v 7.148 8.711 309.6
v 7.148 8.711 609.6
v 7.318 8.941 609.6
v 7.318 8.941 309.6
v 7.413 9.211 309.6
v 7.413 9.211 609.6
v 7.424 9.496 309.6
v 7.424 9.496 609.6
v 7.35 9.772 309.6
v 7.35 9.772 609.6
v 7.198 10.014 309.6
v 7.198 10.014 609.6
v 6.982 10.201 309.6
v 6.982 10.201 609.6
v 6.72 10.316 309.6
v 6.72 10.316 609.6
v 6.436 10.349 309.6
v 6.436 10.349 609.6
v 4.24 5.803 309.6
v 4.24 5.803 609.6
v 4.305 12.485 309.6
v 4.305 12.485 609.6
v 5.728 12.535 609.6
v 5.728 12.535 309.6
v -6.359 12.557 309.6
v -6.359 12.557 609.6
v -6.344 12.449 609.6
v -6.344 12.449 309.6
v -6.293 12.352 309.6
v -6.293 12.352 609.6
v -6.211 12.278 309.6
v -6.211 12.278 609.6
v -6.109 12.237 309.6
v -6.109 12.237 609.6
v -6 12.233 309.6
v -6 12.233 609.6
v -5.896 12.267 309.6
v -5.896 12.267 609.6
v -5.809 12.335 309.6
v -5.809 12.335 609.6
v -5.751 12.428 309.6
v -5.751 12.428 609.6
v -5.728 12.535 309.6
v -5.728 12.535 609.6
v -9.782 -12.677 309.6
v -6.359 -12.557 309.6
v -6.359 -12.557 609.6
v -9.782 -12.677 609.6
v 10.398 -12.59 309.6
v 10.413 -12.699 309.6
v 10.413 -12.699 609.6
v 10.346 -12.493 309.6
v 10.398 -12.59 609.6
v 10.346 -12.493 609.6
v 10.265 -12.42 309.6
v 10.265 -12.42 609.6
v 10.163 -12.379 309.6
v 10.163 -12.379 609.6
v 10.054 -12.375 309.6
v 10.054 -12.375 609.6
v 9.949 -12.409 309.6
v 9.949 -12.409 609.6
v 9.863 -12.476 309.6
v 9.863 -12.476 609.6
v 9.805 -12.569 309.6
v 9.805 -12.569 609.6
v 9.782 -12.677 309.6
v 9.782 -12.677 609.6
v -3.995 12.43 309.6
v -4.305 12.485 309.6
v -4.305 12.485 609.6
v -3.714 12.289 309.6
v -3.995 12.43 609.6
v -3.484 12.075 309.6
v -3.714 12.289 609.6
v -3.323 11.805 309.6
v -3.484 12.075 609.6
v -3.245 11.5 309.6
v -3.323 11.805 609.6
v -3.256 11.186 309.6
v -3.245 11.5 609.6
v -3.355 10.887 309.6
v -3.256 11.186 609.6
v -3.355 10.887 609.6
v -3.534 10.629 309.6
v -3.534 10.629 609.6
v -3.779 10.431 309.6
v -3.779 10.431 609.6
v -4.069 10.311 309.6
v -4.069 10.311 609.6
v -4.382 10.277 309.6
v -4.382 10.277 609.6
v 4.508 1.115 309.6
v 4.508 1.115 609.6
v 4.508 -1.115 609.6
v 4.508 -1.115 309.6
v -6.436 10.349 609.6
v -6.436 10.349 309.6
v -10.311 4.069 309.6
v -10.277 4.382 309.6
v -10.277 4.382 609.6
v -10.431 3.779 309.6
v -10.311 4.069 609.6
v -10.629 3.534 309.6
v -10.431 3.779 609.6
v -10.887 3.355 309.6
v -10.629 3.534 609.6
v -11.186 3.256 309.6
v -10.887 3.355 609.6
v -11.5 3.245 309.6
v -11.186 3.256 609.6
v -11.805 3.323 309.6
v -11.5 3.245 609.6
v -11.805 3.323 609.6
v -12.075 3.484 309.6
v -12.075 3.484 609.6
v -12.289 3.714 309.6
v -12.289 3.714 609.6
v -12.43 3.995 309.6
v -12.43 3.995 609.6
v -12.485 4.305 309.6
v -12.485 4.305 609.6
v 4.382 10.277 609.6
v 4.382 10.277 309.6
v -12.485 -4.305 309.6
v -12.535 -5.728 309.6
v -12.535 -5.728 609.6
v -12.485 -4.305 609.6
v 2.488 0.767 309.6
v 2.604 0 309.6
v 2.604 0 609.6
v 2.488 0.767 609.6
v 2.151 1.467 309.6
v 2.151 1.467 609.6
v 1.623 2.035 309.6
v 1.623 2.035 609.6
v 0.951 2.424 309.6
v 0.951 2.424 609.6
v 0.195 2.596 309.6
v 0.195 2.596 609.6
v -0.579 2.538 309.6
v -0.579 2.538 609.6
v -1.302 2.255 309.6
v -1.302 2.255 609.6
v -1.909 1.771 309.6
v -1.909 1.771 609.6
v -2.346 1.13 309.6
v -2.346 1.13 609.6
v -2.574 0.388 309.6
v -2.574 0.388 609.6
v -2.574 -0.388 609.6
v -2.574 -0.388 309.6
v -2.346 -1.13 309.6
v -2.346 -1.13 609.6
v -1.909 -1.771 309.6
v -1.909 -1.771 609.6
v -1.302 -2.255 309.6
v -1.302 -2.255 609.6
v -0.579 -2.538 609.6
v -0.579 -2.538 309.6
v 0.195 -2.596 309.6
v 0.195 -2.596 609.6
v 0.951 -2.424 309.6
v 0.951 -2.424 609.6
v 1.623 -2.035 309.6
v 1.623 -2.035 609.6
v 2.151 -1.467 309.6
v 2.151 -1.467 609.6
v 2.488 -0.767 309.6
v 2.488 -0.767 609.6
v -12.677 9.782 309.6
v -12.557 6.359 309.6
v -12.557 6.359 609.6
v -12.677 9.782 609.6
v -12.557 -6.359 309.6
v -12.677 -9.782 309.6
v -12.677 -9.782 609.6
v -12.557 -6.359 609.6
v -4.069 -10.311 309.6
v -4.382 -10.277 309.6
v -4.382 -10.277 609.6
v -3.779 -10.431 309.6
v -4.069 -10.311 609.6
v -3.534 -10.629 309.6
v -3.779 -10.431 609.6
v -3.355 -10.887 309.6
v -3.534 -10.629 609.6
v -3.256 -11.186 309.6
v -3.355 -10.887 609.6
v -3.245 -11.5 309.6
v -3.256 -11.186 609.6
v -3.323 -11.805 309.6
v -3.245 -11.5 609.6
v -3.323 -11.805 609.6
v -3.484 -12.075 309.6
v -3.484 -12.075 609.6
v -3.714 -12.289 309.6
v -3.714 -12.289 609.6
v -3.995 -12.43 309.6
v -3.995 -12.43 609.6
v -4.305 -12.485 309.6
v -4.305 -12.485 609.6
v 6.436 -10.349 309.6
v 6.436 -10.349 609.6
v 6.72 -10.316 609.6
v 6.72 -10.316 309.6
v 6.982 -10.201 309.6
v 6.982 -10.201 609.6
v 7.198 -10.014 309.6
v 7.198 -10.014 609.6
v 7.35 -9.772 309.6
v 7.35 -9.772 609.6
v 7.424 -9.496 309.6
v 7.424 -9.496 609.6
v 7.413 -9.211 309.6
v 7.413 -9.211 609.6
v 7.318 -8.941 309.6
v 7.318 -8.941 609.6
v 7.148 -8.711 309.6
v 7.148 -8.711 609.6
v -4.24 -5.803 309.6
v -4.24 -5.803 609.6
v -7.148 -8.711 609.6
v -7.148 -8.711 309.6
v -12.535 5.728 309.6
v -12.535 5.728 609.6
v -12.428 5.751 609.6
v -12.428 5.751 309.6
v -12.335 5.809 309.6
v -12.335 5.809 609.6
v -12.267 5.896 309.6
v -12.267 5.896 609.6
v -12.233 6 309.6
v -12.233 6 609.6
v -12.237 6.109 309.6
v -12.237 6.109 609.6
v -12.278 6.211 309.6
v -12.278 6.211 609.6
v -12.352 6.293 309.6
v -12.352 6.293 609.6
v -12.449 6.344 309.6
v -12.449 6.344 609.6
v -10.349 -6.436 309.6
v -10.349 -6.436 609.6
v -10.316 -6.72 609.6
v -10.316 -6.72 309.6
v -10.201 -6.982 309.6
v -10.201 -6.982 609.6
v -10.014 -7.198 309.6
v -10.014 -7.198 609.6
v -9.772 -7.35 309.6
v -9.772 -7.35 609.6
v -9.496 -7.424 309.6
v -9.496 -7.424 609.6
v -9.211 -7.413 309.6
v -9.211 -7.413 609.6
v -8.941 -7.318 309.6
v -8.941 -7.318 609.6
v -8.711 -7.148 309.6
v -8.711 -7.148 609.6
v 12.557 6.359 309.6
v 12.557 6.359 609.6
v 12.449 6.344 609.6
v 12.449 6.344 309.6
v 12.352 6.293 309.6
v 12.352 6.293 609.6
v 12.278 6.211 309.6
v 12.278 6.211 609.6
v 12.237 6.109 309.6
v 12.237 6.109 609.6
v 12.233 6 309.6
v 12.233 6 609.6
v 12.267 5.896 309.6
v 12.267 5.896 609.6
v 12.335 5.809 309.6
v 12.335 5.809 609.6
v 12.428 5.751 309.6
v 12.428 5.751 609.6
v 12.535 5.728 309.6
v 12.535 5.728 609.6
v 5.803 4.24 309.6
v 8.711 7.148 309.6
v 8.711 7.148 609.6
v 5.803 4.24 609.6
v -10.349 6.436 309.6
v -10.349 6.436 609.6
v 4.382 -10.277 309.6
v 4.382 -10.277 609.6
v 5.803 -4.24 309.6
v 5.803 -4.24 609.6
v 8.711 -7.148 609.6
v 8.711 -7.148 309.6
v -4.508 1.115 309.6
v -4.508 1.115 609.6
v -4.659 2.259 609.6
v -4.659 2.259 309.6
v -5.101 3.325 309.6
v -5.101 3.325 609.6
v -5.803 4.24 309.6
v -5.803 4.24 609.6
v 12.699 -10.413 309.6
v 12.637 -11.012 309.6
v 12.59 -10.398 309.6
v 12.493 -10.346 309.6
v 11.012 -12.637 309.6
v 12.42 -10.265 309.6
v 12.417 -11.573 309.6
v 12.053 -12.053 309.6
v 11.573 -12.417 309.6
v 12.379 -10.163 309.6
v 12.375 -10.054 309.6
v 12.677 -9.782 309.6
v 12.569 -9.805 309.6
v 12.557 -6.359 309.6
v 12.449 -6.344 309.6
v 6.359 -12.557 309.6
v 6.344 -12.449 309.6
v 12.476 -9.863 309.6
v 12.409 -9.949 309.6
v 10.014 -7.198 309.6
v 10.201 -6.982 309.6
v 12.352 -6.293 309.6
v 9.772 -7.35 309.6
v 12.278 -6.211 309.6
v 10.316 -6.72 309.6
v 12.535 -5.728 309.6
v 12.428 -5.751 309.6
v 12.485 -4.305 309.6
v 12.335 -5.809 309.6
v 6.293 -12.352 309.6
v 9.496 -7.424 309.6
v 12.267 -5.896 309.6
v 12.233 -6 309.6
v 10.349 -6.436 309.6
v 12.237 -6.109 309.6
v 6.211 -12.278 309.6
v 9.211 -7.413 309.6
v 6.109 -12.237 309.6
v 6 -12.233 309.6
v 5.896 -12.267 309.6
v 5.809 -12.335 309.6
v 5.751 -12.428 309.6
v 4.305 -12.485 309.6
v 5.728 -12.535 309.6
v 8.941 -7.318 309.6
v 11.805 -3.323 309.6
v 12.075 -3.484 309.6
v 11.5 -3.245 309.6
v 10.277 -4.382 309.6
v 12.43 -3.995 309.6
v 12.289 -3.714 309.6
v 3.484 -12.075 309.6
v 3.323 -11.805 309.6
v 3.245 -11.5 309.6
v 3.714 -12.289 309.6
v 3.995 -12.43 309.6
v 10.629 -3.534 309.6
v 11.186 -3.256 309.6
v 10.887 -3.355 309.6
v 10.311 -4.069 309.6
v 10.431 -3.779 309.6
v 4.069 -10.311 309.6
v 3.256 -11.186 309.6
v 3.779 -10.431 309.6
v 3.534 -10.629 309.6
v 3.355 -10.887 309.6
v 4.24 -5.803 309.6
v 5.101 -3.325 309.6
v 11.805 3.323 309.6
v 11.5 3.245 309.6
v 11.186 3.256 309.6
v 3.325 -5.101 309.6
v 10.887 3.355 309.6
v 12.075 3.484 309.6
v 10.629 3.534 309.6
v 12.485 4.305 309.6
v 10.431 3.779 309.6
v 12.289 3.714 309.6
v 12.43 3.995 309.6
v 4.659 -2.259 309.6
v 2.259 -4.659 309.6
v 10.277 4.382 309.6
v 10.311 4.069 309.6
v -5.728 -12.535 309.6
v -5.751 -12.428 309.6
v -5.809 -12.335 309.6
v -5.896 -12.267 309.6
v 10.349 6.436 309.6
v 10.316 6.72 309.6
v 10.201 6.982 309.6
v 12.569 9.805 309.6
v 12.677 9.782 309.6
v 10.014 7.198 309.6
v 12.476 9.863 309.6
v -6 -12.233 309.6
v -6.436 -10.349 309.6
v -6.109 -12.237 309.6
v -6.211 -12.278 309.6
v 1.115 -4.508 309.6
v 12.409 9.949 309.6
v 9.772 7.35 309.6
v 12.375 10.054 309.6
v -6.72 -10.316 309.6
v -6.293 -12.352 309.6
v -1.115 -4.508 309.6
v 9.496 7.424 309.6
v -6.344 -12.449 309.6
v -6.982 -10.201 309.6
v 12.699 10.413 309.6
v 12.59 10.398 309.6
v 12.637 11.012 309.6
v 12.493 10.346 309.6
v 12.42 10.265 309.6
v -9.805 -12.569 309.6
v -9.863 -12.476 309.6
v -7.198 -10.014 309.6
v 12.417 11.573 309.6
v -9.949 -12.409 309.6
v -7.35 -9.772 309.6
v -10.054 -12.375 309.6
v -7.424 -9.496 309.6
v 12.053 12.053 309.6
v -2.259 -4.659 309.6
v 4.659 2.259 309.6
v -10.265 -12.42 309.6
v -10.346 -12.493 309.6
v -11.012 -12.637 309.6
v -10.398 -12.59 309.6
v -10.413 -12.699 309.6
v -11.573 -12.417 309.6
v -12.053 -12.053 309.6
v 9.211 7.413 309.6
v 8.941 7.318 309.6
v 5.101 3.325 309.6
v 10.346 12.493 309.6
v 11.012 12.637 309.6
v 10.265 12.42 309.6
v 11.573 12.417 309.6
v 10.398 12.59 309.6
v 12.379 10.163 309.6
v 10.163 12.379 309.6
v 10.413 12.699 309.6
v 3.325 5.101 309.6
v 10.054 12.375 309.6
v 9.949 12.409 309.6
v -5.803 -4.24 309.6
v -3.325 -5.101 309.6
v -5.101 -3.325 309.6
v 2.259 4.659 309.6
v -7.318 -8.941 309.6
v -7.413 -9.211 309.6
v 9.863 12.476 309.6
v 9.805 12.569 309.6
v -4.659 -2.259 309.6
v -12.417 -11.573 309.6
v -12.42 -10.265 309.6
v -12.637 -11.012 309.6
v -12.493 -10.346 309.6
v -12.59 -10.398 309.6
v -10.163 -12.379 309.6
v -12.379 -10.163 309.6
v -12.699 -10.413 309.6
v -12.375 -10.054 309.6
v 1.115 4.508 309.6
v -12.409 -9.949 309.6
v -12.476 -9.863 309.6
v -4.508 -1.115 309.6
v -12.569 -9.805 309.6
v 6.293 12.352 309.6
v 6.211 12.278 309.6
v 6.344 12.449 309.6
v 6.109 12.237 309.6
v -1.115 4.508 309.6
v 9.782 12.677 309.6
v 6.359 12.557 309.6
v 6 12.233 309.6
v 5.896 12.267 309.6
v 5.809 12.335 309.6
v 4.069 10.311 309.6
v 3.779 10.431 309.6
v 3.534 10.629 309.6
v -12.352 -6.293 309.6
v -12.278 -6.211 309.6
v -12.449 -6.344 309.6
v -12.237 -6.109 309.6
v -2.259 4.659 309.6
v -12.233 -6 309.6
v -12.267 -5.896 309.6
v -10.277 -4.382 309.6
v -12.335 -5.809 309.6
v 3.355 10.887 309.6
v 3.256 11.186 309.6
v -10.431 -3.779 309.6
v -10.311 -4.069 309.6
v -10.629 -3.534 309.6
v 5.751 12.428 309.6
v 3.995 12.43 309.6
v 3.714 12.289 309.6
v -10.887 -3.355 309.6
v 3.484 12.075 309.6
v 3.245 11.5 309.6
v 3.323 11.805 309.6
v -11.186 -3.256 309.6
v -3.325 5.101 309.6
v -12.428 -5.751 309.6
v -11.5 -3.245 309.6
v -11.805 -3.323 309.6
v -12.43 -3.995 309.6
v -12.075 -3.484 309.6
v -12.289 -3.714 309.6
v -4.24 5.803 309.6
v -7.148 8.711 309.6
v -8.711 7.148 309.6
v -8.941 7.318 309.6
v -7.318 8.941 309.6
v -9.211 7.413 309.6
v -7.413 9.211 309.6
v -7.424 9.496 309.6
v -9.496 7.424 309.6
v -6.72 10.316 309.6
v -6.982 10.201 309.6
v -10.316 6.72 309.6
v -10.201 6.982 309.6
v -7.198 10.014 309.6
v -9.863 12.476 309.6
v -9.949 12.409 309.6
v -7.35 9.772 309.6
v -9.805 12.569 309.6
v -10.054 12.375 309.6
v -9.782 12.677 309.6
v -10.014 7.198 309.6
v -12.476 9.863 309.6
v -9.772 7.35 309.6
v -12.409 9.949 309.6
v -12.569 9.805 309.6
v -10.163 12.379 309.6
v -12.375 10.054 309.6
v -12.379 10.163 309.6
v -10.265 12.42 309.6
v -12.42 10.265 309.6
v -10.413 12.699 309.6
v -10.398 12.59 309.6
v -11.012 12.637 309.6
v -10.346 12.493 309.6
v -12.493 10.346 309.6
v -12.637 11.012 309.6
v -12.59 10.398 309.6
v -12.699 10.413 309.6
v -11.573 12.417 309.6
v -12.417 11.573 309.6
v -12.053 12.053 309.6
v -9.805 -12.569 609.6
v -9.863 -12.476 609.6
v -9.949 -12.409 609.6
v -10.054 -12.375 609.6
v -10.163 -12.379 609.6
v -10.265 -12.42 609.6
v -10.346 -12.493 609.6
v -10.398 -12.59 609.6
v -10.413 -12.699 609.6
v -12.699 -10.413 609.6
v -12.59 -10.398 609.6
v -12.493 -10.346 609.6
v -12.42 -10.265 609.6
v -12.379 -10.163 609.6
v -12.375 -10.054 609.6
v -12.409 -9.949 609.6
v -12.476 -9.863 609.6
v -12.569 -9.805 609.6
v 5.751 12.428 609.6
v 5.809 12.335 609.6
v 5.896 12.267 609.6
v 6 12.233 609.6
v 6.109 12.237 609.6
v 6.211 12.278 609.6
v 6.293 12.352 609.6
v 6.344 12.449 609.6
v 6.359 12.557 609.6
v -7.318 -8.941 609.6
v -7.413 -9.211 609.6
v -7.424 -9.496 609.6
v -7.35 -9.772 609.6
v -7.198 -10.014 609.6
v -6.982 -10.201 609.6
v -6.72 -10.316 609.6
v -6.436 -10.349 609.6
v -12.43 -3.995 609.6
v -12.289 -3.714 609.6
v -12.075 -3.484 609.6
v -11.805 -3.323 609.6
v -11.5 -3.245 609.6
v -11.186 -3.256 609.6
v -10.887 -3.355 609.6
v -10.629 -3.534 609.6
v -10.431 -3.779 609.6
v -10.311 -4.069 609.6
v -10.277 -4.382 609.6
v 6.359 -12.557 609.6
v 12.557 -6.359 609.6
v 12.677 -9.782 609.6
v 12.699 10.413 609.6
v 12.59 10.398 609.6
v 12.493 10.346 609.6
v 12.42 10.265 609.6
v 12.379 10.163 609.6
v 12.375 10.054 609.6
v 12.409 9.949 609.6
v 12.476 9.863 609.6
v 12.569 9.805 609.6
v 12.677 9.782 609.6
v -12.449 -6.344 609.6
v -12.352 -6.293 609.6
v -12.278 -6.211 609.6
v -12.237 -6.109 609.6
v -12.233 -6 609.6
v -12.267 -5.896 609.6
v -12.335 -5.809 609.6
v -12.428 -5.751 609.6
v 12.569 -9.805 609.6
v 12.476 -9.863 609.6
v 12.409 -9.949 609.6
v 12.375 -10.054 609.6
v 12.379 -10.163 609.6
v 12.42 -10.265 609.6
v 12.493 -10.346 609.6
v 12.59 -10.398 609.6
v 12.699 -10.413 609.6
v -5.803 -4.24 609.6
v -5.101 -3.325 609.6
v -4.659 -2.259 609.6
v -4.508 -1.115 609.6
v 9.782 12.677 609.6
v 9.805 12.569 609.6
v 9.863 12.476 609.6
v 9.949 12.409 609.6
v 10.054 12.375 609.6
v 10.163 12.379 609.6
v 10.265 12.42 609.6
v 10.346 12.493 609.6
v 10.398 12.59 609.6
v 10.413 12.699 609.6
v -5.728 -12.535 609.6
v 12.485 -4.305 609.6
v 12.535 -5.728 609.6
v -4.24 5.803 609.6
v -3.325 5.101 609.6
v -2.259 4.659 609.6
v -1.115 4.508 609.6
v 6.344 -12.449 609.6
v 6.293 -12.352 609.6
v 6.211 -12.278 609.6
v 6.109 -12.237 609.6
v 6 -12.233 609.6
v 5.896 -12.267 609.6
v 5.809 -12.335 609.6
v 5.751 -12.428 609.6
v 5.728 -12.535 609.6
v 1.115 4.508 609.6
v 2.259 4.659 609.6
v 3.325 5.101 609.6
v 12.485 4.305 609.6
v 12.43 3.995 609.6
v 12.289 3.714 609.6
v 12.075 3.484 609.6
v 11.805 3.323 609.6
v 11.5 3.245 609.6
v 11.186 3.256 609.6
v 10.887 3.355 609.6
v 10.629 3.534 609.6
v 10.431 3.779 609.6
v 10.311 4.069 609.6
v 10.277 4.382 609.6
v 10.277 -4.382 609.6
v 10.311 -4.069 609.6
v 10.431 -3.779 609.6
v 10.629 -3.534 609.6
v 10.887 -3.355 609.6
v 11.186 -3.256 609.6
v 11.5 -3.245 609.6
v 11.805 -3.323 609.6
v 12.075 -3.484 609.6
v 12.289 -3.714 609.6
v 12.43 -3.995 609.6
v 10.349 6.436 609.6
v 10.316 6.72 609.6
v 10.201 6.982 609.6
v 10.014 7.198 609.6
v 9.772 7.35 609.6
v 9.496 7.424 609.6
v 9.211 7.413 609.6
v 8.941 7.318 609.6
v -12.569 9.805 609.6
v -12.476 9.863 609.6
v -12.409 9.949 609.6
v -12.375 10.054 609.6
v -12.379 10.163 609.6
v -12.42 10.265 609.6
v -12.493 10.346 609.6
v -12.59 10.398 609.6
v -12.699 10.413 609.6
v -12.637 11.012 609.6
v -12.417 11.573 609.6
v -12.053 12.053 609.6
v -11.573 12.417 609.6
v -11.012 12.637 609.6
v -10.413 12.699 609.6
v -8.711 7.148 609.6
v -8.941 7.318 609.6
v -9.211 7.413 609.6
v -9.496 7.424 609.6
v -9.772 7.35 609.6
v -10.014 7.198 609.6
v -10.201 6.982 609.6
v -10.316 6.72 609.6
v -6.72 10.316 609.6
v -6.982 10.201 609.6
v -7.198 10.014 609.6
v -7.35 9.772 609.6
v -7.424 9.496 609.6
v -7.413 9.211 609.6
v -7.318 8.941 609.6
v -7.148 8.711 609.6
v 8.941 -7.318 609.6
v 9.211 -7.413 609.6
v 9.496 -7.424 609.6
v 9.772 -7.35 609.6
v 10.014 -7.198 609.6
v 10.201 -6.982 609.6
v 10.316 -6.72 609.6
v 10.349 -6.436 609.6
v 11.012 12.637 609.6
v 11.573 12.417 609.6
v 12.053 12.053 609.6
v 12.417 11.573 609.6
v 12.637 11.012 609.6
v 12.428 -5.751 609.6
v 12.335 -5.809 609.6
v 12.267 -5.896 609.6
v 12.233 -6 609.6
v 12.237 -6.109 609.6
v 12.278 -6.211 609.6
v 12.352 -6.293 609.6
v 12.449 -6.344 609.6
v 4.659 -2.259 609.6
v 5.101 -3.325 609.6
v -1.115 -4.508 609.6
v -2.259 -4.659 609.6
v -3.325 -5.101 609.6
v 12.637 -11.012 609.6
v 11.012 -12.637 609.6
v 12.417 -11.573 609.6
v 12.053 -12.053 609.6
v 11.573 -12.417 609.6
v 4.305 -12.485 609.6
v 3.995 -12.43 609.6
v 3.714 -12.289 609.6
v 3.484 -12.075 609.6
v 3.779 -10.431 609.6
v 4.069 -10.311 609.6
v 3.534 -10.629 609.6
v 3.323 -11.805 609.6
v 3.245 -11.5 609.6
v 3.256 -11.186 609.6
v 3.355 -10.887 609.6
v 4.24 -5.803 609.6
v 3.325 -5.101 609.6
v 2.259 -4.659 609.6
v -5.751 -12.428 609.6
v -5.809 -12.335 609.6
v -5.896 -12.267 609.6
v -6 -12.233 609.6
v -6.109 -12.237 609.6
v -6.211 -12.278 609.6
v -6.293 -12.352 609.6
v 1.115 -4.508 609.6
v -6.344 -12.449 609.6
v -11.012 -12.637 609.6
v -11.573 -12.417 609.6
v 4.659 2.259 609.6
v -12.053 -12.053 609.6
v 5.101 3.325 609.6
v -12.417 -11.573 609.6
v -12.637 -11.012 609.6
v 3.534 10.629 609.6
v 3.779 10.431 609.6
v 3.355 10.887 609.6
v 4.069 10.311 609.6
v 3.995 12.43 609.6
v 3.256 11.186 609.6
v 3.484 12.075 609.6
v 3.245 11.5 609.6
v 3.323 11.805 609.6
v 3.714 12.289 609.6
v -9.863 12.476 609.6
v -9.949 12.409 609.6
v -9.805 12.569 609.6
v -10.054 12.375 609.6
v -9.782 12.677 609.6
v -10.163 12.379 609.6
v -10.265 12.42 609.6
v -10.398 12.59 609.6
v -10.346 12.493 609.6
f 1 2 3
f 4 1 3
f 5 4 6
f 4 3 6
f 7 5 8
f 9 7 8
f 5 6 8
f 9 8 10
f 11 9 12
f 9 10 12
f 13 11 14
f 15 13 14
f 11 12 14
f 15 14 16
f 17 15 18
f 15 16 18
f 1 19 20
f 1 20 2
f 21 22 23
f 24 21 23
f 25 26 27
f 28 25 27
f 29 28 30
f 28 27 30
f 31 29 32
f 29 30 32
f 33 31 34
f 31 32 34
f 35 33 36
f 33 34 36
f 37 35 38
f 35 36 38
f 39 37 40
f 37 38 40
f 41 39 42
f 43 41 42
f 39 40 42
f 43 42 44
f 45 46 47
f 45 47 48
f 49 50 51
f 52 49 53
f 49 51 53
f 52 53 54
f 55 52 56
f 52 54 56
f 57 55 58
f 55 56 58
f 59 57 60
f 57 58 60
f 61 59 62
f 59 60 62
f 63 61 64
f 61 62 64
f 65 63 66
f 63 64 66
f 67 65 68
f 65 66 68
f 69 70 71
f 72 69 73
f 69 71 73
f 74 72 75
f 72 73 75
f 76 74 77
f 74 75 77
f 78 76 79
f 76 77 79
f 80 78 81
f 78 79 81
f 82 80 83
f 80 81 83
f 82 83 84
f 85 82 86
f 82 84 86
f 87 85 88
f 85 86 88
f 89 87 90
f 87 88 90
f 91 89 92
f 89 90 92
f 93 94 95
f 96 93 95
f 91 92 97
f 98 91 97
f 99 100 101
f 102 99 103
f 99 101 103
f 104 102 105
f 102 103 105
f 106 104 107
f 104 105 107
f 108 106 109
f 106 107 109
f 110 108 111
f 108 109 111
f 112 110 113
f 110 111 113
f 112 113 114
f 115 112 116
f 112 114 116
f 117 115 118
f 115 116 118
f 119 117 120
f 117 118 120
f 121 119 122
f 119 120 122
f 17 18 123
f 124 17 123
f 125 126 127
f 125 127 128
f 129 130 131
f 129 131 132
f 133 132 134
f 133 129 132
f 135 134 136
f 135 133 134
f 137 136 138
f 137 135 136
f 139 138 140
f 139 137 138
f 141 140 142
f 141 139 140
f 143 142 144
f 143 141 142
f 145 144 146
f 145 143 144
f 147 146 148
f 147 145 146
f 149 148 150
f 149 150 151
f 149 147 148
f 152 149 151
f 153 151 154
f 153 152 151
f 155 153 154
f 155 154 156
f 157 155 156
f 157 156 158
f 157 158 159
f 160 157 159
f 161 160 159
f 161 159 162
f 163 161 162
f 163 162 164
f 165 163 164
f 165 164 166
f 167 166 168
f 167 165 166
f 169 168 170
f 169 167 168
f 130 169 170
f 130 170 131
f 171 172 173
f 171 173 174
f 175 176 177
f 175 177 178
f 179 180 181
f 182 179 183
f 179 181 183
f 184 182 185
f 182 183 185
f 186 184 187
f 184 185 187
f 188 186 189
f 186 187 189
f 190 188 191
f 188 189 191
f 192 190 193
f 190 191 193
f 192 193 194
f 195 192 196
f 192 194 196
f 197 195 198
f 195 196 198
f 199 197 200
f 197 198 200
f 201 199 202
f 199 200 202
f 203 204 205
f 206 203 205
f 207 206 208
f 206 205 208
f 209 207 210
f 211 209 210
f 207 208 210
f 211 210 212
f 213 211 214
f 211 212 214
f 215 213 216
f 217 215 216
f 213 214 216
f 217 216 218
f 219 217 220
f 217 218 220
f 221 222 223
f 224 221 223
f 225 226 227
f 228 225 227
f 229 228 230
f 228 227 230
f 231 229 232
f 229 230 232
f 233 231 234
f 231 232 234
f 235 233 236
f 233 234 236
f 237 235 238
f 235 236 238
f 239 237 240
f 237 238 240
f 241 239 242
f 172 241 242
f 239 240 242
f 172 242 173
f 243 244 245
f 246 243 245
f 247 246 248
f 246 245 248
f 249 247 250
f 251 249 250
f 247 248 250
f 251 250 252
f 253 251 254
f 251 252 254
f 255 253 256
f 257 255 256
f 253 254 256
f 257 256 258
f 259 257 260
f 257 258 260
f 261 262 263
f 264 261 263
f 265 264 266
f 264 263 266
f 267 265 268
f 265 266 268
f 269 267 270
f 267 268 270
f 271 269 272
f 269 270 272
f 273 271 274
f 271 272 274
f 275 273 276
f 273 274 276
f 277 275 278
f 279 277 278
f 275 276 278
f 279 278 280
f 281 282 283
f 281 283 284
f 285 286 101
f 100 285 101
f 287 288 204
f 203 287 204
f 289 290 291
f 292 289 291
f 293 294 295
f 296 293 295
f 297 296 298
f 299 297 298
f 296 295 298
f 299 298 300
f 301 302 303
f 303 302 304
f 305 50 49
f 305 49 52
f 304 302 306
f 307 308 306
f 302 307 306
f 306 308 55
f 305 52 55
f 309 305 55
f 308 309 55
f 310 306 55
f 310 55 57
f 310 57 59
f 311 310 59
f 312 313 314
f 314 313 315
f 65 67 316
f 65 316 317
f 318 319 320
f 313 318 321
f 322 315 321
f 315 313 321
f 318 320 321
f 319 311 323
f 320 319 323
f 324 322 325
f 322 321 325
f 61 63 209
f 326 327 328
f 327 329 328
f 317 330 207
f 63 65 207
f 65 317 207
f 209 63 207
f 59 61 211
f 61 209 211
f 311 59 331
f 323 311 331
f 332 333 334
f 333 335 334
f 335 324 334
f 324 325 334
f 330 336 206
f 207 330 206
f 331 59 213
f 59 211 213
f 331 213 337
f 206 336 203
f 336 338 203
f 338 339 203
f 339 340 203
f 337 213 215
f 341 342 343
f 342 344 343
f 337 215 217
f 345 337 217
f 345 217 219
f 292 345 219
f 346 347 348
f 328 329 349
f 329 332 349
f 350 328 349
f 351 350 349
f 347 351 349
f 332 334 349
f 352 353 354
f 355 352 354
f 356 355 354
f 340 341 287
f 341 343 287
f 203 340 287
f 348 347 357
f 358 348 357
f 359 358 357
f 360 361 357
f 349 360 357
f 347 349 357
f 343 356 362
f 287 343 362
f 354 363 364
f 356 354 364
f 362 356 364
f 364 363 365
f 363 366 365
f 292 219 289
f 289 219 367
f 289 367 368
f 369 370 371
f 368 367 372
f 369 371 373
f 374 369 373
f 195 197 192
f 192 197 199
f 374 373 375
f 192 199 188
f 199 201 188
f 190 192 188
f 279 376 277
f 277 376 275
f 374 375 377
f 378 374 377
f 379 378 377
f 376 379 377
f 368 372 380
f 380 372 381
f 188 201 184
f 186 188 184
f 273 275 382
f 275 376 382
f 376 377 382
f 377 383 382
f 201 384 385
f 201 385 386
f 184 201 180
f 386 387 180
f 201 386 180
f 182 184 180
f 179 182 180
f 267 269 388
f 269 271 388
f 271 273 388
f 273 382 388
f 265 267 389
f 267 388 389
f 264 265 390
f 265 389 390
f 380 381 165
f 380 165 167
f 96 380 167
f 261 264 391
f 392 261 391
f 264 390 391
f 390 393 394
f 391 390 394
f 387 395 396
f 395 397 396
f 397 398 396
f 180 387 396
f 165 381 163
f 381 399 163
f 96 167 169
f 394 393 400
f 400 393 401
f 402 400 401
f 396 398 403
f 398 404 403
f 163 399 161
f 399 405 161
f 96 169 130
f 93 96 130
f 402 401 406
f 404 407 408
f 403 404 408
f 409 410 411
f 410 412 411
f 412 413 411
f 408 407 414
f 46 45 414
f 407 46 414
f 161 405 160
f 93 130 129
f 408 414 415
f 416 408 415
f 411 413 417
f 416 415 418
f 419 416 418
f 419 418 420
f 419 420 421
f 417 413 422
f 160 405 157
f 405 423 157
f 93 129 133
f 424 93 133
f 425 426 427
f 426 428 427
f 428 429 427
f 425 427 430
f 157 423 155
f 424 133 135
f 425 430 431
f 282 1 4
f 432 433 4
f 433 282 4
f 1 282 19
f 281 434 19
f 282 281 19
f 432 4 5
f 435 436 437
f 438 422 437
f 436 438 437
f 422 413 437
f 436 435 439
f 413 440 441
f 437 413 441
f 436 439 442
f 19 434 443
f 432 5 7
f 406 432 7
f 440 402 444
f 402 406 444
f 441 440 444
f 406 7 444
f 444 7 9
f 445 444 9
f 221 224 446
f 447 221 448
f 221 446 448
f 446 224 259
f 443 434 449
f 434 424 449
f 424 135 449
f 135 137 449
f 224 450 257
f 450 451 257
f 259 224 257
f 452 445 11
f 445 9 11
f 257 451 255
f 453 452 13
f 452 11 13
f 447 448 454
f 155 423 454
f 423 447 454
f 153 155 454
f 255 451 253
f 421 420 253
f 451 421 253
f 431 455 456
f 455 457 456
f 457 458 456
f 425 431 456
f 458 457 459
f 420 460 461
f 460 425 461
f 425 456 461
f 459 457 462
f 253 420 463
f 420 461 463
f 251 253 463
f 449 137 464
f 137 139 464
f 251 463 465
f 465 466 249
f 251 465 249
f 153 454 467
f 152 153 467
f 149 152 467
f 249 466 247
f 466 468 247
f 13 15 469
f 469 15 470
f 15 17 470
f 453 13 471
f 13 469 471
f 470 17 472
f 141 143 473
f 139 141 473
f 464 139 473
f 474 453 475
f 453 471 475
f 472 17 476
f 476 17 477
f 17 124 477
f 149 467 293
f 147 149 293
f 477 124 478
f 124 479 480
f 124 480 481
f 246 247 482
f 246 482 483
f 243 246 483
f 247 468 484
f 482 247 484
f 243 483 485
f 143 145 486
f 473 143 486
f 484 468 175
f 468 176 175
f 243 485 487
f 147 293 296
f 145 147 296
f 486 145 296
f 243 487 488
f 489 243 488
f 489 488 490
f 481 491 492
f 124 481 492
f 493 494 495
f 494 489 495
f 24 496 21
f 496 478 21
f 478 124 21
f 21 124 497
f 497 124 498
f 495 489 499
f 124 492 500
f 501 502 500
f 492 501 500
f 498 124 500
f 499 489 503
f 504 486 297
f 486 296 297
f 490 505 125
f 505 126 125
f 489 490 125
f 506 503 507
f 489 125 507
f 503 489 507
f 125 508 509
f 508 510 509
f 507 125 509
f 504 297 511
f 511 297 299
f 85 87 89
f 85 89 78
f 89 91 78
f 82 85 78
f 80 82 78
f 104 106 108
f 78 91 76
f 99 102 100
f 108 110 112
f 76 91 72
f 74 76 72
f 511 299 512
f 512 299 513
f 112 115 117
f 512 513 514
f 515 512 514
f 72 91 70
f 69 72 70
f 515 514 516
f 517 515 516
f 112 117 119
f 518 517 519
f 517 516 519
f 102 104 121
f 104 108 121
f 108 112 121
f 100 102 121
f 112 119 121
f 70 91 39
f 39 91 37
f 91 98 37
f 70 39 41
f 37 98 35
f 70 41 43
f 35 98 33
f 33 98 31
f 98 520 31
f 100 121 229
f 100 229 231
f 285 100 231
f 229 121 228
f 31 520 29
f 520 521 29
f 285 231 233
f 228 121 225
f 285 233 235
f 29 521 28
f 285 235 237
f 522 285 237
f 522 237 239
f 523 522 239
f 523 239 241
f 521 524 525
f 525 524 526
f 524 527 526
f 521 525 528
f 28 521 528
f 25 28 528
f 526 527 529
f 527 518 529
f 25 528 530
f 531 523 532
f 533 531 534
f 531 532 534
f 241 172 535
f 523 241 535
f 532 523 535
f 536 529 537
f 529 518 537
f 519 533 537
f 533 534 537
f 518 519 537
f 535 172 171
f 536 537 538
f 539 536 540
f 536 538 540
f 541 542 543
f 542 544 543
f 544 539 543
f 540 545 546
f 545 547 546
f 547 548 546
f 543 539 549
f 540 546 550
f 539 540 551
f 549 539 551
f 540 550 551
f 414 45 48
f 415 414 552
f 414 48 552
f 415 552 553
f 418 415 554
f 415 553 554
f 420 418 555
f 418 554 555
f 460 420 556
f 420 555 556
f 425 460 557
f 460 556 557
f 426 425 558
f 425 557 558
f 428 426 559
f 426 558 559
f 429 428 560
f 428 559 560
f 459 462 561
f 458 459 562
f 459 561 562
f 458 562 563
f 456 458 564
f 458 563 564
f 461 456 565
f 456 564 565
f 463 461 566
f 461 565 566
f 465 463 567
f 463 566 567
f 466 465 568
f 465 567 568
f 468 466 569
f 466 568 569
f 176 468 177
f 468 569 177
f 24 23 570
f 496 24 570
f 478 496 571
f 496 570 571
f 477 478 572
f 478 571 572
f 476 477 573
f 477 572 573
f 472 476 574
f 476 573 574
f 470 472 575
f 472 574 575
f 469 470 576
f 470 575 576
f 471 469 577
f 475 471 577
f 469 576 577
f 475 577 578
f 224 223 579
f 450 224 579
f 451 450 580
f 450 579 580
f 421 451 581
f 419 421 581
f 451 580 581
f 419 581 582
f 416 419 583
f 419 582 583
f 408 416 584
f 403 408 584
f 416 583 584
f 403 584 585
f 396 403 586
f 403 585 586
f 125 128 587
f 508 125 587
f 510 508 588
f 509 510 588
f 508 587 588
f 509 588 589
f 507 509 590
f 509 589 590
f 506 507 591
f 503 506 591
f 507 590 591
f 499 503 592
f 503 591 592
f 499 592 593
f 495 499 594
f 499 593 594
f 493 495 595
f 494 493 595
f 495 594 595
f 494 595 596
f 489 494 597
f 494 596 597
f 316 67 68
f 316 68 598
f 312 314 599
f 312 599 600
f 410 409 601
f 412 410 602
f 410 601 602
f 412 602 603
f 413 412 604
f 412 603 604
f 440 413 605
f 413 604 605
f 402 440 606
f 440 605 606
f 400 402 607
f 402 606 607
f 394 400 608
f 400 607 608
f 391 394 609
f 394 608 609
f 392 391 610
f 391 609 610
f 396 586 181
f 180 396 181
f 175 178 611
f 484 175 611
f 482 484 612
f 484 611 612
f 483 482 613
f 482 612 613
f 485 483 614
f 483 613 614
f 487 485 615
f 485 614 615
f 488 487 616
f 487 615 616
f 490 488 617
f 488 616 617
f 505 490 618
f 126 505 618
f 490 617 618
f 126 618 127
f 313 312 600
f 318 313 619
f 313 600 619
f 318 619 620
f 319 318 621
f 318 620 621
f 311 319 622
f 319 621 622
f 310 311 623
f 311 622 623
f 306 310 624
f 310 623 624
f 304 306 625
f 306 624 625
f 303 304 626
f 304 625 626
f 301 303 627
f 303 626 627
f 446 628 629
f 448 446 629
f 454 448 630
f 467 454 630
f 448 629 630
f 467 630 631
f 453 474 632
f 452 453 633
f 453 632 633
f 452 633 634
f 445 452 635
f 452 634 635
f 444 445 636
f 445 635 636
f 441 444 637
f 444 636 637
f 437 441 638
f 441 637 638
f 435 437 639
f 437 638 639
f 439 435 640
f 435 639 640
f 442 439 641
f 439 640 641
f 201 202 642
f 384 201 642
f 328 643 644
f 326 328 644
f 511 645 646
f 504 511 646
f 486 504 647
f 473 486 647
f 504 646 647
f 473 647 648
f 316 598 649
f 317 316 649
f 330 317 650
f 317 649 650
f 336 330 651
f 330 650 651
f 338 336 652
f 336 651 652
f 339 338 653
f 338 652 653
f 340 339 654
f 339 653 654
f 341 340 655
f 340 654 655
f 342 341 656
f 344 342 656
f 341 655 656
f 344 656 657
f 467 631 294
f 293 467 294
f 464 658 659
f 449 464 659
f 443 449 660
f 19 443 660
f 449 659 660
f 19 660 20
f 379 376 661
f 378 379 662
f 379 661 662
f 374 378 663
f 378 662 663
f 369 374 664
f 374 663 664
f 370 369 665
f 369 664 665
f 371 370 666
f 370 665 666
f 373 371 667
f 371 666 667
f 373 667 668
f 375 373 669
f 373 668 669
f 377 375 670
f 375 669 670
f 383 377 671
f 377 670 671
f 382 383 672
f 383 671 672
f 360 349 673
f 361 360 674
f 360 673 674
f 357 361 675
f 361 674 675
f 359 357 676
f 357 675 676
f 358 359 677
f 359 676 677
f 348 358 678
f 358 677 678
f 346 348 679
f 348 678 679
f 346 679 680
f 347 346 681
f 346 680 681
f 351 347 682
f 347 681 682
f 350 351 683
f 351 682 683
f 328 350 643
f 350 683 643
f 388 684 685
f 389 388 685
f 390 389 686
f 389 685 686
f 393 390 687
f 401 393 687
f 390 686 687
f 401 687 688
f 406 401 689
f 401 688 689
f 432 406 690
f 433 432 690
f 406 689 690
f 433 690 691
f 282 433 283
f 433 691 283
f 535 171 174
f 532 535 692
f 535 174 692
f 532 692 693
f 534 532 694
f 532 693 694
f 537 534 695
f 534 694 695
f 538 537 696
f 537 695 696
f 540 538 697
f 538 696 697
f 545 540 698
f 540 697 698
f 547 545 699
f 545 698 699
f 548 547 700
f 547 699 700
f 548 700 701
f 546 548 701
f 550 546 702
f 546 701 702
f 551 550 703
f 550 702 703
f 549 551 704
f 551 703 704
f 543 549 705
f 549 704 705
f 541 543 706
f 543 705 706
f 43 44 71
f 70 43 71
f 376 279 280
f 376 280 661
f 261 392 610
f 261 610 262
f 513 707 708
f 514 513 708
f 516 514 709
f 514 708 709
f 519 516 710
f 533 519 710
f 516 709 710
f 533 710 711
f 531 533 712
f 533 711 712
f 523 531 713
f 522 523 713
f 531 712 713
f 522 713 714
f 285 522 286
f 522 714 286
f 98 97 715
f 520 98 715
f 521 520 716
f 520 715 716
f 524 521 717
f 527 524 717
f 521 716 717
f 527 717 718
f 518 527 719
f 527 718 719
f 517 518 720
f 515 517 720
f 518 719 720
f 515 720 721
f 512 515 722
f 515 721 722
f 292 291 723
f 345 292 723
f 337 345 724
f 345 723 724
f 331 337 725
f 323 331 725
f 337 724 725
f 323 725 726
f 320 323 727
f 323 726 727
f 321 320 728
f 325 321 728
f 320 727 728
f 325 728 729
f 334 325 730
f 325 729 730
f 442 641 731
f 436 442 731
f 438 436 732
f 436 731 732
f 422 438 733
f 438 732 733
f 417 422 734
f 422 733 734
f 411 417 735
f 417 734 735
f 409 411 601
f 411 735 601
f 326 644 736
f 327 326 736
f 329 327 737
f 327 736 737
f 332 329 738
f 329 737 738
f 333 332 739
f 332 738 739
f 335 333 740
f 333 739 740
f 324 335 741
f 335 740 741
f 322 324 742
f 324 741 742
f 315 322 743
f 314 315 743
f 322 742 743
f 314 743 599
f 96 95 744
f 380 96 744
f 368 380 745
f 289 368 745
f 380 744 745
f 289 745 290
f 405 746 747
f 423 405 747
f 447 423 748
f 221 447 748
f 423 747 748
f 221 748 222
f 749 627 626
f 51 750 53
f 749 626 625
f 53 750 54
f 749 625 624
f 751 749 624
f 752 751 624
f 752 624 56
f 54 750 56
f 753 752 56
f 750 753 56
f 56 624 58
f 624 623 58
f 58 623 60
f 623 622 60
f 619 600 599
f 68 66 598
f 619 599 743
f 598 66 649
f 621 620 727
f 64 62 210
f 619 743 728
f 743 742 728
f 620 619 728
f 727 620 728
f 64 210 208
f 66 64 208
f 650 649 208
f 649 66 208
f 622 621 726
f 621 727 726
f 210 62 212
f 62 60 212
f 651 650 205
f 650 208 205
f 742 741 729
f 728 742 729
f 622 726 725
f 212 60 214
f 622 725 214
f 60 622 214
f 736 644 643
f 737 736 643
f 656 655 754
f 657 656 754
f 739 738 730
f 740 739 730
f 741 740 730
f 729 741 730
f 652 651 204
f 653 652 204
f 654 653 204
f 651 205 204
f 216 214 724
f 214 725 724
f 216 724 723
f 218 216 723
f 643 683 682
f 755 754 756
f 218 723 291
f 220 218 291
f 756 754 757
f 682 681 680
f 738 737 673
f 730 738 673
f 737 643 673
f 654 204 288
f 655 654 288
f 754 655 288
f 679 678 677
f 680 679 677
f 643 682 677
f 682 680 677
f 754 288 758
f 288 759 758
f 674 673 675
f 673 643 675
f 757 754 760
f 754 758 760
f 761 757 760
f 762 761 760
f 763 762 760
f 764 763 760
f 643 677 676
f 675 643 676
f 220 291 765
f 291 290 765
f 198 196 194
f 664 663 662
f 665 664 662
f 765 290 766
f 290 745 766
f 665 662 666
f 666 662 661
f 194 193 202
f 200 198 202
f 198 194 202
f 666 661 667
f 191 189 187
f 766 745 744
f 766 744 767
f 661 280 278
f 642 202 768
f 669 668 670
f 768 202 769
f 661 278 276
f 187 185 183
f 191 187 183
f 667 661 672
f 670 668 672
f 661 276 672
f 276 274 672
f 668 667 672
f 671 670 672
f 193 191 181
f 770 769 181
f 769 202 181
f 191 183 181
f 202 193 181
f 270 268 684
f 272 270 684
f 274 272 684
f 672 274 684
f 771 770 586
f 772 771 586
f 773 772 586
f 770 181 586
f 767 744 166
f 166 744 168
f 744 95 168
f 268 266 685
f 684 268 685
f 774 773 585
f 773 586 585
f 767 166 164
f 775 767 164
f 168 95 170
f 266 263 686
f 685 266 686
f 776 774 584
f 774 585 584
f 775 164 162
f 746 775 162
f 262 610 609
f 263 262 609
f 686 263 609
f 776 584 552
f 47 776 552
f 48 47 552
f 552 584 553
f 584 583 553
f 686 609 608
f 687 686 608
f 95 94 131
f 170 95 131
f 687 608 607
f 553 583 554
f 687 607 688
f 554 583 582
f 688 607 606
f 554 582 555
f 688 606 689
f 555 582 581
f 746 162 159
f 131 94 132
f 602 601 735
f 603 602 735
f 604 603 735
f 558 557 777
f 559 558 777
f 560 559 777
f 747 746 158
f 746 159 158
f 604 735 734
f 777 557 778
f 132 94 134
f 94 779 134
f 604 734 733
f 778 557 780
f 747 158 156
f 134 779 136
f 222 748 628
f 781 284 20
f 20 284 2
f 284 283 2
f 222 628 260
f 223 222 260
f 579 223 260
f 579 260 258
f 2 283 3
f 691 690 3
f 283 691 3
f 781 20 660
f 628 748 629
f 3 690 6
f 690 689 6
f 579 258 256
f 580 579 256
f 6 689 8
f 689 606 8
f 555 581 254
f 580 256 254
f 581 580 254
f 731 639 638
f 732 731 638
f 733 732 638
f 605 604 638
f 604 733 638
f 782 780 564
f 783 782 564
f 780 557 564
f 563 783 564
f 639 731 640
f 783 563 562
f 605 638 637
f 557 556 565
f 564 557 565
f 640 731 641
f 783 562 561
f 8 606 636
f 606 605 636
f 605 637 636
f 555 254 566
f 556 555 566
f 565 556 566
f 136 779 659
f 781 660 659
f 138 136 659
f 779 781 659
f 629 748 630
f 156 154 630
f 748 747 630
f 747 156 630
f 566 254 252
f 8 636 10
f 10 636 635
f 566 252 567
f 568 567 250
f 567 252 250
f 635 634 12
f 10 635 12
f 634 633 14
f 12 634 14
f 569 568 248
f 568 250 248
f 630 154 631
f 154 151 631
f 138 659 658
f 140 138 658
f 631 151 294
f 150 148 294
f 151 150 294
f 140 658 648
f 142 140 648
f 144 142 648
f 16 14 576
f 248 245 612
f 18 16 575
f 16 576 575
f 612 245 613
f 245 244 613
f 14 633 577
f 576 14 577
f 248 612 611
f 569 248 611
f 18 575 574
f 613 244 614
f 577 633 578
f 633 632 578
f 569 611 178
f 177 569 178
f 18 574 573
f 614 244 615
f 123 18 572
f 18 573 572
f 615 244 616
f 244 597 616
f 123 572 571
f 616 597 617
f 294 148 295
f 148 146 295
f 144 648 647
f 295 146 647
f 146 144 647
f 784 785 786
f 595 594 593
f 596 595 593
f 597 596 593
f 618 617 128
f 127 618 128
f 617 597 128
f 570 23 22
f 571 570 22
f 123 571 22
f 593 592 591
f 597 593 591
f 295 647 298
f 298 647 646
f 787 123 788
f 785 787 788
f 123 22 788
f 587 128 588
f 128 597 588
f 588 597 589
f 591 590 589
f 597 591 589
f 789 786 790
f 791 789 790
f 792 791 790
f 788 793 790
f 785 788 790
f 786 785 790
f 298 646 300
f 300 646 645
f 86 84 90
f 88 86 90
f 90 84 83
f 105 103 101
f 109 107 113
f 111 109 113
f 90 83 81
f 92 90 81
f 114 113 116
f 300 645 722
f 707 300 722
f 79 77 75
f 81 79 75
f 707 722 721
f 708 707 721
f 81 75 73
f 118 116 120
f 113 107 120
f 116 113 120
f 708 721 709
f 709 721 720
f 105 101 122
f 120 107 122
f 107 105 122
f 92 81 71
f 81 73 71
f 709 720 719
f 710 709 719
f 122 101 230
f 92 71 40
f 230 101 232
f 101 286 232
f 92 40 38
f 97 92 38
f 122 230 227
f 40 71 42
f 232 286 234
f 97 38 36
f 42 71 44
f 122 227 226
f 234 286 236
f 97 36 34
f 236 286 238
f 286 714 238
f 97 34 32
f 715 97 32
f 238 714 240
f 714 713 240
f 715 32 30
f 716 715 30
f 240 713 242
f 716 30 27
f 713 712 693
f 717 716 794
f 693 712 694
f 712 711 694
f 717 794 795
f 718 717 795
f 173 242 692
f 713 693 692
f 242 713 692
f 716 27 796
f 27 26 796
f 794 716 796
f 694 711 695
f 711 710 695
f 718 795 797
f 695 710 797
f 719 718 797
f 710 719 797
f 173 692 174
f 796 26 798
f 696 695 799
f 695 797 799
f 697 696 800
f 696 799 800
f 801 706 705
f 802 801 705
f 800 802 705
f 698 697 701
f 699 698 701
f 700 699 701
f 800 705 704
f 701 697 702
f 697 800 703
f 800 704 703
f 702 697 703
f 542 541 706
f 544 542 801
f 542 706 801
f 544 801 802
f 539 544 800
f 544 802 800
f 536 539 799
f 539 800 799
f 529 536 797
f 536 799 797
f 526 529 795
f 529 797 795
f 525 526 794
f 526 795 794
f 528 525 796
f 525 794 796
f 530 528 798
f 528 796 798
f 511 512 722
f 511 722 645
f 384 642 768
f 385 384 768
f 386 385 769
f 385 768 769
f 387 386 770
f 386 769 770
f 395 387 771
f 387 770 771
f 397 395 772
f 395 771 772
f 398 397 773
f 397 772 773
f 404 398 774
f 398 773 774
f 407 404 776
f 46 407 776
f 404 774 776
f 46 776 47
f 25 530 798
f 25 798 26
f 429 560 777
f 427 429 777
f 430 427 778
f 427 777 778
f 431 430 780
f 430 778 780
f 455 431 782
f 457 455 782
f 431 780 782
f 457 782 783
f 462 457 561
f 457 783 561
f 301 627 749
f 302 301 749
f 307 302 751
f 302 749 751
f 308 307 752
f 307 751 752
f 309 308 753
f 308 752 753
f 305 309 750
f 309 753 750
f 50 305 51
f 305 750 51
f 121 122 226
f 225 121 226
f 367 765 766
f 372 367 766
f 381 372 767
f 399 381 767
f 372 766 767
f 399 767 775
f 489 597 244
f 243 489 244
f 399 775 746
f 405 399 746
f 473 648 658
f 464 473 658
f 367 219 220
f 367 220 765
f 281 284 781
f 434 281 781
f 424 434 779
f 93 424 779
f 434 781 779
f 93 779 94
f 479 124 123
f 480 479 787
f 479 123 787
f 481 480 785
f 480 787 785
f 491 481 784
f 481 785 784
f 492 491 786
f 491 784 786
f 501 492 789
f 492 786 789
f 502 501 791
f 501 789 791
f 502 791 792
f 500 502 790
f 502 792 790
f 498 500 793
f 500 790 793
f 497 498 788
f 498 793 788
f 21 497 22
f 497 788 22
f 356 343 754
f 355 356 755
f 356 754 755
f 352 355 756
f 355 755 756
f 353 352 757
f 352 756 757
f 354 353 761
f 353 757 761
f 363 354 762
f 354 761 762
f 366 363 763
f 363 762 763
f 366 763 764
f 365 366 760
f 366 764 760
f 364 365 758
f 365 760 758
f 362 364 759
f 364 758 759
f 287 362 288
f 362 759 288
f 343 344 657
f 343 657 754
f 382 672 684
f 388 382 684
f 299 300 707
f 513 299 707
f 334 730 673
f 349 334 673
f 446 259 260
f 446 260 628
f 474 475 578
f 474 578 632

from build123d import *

# Parameters (mm, degrees)
SKETCH3_R               = 2.6035
EXTRUDE1_DEPTH          = 609.6
CUT_EXTRUDE1_DEPTH      = 64
CUT_EXTRUDE1_DEPTH_BACK = 64
SKETCH4_W               = 919.2
SKETCH4_H               = 58.016705437


with BuildPart() as part:
    # Sketch3 → Extrude1 (new, symmetric)
    with BuildSketch(Plane.XY):
        with BuildLine():
            Line((-1.115277175, 4.5085), (1.115277175, 4.5085))
            ThreePointArc((1.115277175, 4.5085), (2.806584872, 4.844922018), (4.240406305, 5.80297087))
            Line((4.240406305, 5.80297087), (7.148423664, 8.710988229))
            ThreePointArc((7.148423664, 8.710988229), (7.349906316, 9.772227925), (6.436353897, 10.348636575))
            Line((6.436353897, 10.348636575), (4.381960454, 10.276895575))
            ThreePointArc((4.381960454, 10.276895575), (3.239173075, 11.342562046), (4.304839546, 12.485349424))
            Line((4.304839546, 12.485349424), (5.728246175, 12.535055879))
            ThreePointArc((5.728246175, 12.535055879), (6.054756855, 12.230579745), (6.35923299, 12.557090424))
            Line((6.35923299, 12.557090424), (9.782092278, 12.676619304))
            ThreePointArc((9.782092278, 12.676619304), (10.108602958, 12.37214317), (10.413079092, 12.69865385))
            ThreePointArc((10.413079092, 12.69865385), (12.052764565, 12.052764565), (12.69865385, 10.413079092))
            ThreePointArc((12.69865385, 10.413079092), (12.37214317, 10.108602958), (12.676619304, 9.782092278))
            Line((12.676619304, 9.782092278), (12.557090424, 6.35923299))
            ThreePointArc((12.557090424, 6.35923299), (12.230579745, 6.054756855), (12.535055879, 5.728246175))
            Line((12.535055879, 5.728246175), (12.485349424, 4.304839546))
            ThreePointArc((12.485349424, 4.304839546), (11.342562046, 3.239173075), (10.276895575, 4.381960454))
            Line((10.276895575, 4.381960454), (10.348636575, 6.436353897))
            ThreePointArc((10.348636575, 6.436353897), (9.772227925, 7.349906316), (8.710988229, 7.148423664))
            Line((8.710988229, 7.148423664), (5.80297087, 4.240406305))
            ThreePointArc((5.80297087, 4.240406305), (4.844922018, 2.806584872), (4.5085, 1.115277175))
            Line((4.5085, 1.115277175), (4.5085, -1.115277175))
            ThreePointArc((4.5085, -1.115277175), (4.844922018, -2.806584872), (5.80297087, -4.240406305))
            Line((5.80297087, -4.240406305), (8.710988229, -7.148423664))
            ThreePointArc((8.710988229, -7.148423664), (9.772227925, -7.349906316), (10.348636575, -6.436353897))
            Line((10.348636575, -6.436353897), (10.276895575, -4.381960454))
            ThreePointArc((10.276895575, -4.381960454), (11.342562046, -3.239173075), (12.485349424, -4.304839546))
            Line((12.485349424, -4.304839546), (12.535055879, -5.728246175))
            ThreePointArc((12.535055879, -5.728246175), (12.230579745, -6.054756855), (12.557090424, -6.35923299))
            Line((12.557090424, -6.35923299), (12.676619304, -9.782092278))
            ThreePointArc((12.676619304, -9.782092278), (12.37214317, -10.108602958), (12.69865385, -10.413079092))
            ThreePointArc((12.69865385, -10.413079092), (12.052764565, -12.052764565), (10.413079092, -12.69865385))
            ThreePointArc((10.413079092, -12.69865385), (10.108602958, -12.37214317), (9.782092278, -12.676619304))
            Line((9.782092278, -12.676619304), (6.35923299, -12.557090424))
            ThreePointArc((6.35923299, -12.557090424), (6.054756855, -12.230579745), (5.728246175, -12.535055879))
            Line((5.728246175, -12.535055879), (4.304839546, -12.485349424))
            ThreePointArc((4.304839546, -12.485349424), (3.239173075, -11.342562046), (4.381960454, -10.276895575))
            Line((4.381960454, -10.276895575), (6.436353897, -10.348636575))
            ThreePointArc((6.436353897, -10.348636575), (7.349906316, -9.772227925), (7.148423664, -8.710988229))
            Line((7.148423664, -8.710988229), (4.240406305, -5.80297087))
            ThreePointArc((4.240406305, -5.80297087), (2.806584872, -4.844922018), (1.115277175, -4.5085))
            Line((1.115277175, -4.5085), (-1.115277175, -4.5085))
            ThreePointArc((-1.115277175, -4.5085), (-2.806584872, -4.844922018), (-4.240406305, -5.80297087))
            Line((-4.240406305, -5.80297087), (-7.148423664, -8.710988229))
            ThreePointArc((-7.148423664, -8.710988229), (-7.349906316, -9.772227925), (-6.436353897, -10.348636575))
            Line((-6.436353897, -10.348636575), (-4.381960454, -10.276895575))
            ThreePointArc((-4.381960454, -10.276895575), (-3.239173075, -11.342562046), (-4.304839546, -12.485349424))
            Line((-4.304839546, -12.485349424), (-5.728246175, -12.535055879))
            ThreePointArc((-5.728246175, -12.535055879), (-6.054756855, -12.230579745), (-6.35923299, -12.557090424))
            Line((-6.35923299, -12.557090424), (-9.782092278, -12.676619304))
            ThreePointArc((-9.782092278, -12.676619304), (-10.108602958, -12.37214317), (-10.413079092, -12.69865385))
            ThreePointArc((-10.413079092, -12.69865385), (-12.052764565, -12.052764565), (-12.69865385, -10.413079092))
            ThreePointArc((-12.69865385, -10.413079092), (-12.37214317, -10.108602958), (-12.676619304, -9.782092278))
            Line((-12.676619304, -9.782092278), (-12.557090424, -6.35923299))
            ThreePointArc((-12.557090424, -6.35923299), (-12.230579745, -6.054756855), (-12.535055879, -5.728246175))
            Line((-12.535055879, -5.728246175), (-12.485349424, -4.304839546))
            ThreePointArc((-12.485349424, -4.304839546), (-11.342562046, -3.239173075), (-10.276895575, -4.381960454))
            Line((-10.276895575, -4.381960454), (-10.348636575, -6.436353897))
            ThreePointArc((-10.348636575, -6.436353897), (-9.772227925, -7.349906316), (-8.710988229, -7.148423664))
            Line((-8.710988229, -7.148423664), (-5.80297087, -4.240406305))
            ThreePointArc((-5.80297087, -4.240406305), (-4.844922018, -2.806584872), (-4.5085, -1.115277175))
            Line((-4.5085, -1.115277175), (-4.5085, 1.115277175))
            ThreePointArc((-4.5085, 1.115277175), (-4.844922018, 2.806584872), (-5.80297087, 4.240406305))
            Line((-5.80297087, 4.240406305), (-8.710988229, 7.148423664))
            ThreePointArc((-8.710988229, 7.148423664), (-9.772227925, 7.349906316), (-10.348636575, 6.436353897))
            Line((-10.348636575, 6.436353897), (-10.276895575, 4.381960454))
            ThreePointArc((-10.276895575, 4.381960454), (-11.342562046, 3.239173075), (-12.485349424, 4.304839546))
            Line((-12.485349424, 4.304839546), (-12.535055879, 5.728246175))
            ThreePointArc((-12.535055879, 5.728246175), (-12.230579745, 6.054756855), (-12.557090424, 6.35923299))
            Line((-12.557090424, 6.35923299), (-12.676619304, 9.782092278))
            ThreePointArc((-12.676619304, 9.782092278), (-12.37214317, 10.108602958), (-12.69865385, 10.413079092))
            ThreePointArc((-12.69865385, 10.413079092), (-12.052764565, 12.052764565), (-10.413079092, 12.69865385))
            ThreePointArc((-10.413079092, 12.69865385), (-10.108602958, 12.37214317), (-9.782092278, 12.676619304))
            Line((-9.782092278, 12.676619304), (-6.35923299, 12.557090424))
            ThreePointArc((-6.35923299, 12.557090424), (-6.054756855, 12.230579745), (-5.728246175, 12.535055879))
            Line((-5.728246175, 12.535055879), (-4.304839546, 12.485349424))
            ThreePointArc((-4.304839546, 12.485349424), (-3.239173075, 11.342562046), (-4.381960454, 10.276895575))
            Line((-4.381960454, 10.276895575), (-6.436353897, 10.348636575))
            ThreePointArc((-6.436353897, 10.348636575), (-7.349906316, 9.772227925), (-7.148423664, 8.710988229))
            Line((-7.148423664, 8.710988229), (-4.240406305, 5.80297087))
            ThreePointArc((-4.240406305, 5.80297087), (-2.806584872, 4.844922018), (-1.115277175, 4.5085))
        make_face()
        Circle(SKETCH3_R, mode=Mode.SUBTRACT)
    extrude(amount=EXTRUDE1_DEPTH, both=True)

    # Sketch4 → Cut-Extrude1 (cut, two sides: drawn at the far end of the back side and taken through both)
    with BuildSketch(Plane(origin=(-12.319997369, -0.430223788, 0), x_dir=(0, 0, 1), z_dir=(-0.9993908270190897, -0.03489949670267645, 0)).offset(-CUT_EXTRUDE1_DEPTH_BACK)):
        with Locations((-150, -0.072150678)):
            Rectangle(SKETCH4_W, SKETCH4_H)
    extrude(amount=CUT_EXTRUDE1_DEPTH + CUT_EXTRUDE1_DEPTH_BACK, mode=Mode.SUBTRACT)


solid = part.part
